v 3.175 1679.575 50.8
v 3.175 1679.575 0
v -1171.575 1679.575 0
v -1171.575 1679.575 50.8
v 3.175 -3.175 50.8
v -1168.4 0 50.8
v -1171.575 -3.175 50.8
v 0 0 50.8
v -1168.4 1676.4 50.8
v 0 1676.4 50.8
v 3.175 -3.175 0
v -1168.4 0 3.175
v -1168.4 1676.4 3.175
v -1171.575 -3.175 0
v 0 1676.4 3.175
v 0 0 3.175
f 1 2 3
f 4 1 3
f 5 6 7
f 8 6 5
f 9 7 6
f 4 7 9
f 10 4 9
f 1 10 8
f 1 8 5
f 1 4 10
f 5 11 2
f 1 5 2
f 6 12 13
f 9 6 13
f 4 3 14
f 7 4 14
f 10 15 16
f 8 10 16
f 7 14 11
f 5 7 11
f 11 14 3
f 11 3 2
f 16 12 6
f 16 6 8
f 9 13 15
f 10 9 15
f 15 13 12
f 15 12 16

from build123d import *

# Parameters (mm, degrees)
F0_W     = 1168.4
F0_H     = 1676.4
F1_DEPTH = 3.175
F2_W     = 1168.4
F2_H     = 3.175
F3_DEPTH = 50.8


# Not quite as in the source:
# - a length typed as a fraction of an inch, garbled in the dataset ("3 / 203.2 mm" for 3/8 in), is restored


with BuildPart() as f1:
    # F0 (on Top) → F1 (new body)
    with BuildSketch(Plane.XY):
        with Locations((-584.2, 838.2)):
            Rectangle(F0_W, F0_H)
    extrude(amount=F1_DEPTH)

    # F2 (on Top) → F3 (join)
    with BuildSketch(Plane.XY):
        Polygon((-1168.4, -3.175), (-1168.4, 0), (-1168.4, 1676.4), (-1168.4, 1679.575), (-1171.575, 1679.575), (-1171.575, -3.175), align=None)
        with Locations((-584.2, 1677.9875)):
            Rectangle(F2_W, F2_H)
        Polygon((0, 1676.4), (0, 0), (0, -3.175), (3.175, -3.175), (3.175, 1679.575), (0, 1679.575), align=None)
        with Locations((-584.2, -1.5875)):
            Rectangle(F2_W, F2_H)
    extrude(amount=F3_DEPTH)


solid = f1.part
